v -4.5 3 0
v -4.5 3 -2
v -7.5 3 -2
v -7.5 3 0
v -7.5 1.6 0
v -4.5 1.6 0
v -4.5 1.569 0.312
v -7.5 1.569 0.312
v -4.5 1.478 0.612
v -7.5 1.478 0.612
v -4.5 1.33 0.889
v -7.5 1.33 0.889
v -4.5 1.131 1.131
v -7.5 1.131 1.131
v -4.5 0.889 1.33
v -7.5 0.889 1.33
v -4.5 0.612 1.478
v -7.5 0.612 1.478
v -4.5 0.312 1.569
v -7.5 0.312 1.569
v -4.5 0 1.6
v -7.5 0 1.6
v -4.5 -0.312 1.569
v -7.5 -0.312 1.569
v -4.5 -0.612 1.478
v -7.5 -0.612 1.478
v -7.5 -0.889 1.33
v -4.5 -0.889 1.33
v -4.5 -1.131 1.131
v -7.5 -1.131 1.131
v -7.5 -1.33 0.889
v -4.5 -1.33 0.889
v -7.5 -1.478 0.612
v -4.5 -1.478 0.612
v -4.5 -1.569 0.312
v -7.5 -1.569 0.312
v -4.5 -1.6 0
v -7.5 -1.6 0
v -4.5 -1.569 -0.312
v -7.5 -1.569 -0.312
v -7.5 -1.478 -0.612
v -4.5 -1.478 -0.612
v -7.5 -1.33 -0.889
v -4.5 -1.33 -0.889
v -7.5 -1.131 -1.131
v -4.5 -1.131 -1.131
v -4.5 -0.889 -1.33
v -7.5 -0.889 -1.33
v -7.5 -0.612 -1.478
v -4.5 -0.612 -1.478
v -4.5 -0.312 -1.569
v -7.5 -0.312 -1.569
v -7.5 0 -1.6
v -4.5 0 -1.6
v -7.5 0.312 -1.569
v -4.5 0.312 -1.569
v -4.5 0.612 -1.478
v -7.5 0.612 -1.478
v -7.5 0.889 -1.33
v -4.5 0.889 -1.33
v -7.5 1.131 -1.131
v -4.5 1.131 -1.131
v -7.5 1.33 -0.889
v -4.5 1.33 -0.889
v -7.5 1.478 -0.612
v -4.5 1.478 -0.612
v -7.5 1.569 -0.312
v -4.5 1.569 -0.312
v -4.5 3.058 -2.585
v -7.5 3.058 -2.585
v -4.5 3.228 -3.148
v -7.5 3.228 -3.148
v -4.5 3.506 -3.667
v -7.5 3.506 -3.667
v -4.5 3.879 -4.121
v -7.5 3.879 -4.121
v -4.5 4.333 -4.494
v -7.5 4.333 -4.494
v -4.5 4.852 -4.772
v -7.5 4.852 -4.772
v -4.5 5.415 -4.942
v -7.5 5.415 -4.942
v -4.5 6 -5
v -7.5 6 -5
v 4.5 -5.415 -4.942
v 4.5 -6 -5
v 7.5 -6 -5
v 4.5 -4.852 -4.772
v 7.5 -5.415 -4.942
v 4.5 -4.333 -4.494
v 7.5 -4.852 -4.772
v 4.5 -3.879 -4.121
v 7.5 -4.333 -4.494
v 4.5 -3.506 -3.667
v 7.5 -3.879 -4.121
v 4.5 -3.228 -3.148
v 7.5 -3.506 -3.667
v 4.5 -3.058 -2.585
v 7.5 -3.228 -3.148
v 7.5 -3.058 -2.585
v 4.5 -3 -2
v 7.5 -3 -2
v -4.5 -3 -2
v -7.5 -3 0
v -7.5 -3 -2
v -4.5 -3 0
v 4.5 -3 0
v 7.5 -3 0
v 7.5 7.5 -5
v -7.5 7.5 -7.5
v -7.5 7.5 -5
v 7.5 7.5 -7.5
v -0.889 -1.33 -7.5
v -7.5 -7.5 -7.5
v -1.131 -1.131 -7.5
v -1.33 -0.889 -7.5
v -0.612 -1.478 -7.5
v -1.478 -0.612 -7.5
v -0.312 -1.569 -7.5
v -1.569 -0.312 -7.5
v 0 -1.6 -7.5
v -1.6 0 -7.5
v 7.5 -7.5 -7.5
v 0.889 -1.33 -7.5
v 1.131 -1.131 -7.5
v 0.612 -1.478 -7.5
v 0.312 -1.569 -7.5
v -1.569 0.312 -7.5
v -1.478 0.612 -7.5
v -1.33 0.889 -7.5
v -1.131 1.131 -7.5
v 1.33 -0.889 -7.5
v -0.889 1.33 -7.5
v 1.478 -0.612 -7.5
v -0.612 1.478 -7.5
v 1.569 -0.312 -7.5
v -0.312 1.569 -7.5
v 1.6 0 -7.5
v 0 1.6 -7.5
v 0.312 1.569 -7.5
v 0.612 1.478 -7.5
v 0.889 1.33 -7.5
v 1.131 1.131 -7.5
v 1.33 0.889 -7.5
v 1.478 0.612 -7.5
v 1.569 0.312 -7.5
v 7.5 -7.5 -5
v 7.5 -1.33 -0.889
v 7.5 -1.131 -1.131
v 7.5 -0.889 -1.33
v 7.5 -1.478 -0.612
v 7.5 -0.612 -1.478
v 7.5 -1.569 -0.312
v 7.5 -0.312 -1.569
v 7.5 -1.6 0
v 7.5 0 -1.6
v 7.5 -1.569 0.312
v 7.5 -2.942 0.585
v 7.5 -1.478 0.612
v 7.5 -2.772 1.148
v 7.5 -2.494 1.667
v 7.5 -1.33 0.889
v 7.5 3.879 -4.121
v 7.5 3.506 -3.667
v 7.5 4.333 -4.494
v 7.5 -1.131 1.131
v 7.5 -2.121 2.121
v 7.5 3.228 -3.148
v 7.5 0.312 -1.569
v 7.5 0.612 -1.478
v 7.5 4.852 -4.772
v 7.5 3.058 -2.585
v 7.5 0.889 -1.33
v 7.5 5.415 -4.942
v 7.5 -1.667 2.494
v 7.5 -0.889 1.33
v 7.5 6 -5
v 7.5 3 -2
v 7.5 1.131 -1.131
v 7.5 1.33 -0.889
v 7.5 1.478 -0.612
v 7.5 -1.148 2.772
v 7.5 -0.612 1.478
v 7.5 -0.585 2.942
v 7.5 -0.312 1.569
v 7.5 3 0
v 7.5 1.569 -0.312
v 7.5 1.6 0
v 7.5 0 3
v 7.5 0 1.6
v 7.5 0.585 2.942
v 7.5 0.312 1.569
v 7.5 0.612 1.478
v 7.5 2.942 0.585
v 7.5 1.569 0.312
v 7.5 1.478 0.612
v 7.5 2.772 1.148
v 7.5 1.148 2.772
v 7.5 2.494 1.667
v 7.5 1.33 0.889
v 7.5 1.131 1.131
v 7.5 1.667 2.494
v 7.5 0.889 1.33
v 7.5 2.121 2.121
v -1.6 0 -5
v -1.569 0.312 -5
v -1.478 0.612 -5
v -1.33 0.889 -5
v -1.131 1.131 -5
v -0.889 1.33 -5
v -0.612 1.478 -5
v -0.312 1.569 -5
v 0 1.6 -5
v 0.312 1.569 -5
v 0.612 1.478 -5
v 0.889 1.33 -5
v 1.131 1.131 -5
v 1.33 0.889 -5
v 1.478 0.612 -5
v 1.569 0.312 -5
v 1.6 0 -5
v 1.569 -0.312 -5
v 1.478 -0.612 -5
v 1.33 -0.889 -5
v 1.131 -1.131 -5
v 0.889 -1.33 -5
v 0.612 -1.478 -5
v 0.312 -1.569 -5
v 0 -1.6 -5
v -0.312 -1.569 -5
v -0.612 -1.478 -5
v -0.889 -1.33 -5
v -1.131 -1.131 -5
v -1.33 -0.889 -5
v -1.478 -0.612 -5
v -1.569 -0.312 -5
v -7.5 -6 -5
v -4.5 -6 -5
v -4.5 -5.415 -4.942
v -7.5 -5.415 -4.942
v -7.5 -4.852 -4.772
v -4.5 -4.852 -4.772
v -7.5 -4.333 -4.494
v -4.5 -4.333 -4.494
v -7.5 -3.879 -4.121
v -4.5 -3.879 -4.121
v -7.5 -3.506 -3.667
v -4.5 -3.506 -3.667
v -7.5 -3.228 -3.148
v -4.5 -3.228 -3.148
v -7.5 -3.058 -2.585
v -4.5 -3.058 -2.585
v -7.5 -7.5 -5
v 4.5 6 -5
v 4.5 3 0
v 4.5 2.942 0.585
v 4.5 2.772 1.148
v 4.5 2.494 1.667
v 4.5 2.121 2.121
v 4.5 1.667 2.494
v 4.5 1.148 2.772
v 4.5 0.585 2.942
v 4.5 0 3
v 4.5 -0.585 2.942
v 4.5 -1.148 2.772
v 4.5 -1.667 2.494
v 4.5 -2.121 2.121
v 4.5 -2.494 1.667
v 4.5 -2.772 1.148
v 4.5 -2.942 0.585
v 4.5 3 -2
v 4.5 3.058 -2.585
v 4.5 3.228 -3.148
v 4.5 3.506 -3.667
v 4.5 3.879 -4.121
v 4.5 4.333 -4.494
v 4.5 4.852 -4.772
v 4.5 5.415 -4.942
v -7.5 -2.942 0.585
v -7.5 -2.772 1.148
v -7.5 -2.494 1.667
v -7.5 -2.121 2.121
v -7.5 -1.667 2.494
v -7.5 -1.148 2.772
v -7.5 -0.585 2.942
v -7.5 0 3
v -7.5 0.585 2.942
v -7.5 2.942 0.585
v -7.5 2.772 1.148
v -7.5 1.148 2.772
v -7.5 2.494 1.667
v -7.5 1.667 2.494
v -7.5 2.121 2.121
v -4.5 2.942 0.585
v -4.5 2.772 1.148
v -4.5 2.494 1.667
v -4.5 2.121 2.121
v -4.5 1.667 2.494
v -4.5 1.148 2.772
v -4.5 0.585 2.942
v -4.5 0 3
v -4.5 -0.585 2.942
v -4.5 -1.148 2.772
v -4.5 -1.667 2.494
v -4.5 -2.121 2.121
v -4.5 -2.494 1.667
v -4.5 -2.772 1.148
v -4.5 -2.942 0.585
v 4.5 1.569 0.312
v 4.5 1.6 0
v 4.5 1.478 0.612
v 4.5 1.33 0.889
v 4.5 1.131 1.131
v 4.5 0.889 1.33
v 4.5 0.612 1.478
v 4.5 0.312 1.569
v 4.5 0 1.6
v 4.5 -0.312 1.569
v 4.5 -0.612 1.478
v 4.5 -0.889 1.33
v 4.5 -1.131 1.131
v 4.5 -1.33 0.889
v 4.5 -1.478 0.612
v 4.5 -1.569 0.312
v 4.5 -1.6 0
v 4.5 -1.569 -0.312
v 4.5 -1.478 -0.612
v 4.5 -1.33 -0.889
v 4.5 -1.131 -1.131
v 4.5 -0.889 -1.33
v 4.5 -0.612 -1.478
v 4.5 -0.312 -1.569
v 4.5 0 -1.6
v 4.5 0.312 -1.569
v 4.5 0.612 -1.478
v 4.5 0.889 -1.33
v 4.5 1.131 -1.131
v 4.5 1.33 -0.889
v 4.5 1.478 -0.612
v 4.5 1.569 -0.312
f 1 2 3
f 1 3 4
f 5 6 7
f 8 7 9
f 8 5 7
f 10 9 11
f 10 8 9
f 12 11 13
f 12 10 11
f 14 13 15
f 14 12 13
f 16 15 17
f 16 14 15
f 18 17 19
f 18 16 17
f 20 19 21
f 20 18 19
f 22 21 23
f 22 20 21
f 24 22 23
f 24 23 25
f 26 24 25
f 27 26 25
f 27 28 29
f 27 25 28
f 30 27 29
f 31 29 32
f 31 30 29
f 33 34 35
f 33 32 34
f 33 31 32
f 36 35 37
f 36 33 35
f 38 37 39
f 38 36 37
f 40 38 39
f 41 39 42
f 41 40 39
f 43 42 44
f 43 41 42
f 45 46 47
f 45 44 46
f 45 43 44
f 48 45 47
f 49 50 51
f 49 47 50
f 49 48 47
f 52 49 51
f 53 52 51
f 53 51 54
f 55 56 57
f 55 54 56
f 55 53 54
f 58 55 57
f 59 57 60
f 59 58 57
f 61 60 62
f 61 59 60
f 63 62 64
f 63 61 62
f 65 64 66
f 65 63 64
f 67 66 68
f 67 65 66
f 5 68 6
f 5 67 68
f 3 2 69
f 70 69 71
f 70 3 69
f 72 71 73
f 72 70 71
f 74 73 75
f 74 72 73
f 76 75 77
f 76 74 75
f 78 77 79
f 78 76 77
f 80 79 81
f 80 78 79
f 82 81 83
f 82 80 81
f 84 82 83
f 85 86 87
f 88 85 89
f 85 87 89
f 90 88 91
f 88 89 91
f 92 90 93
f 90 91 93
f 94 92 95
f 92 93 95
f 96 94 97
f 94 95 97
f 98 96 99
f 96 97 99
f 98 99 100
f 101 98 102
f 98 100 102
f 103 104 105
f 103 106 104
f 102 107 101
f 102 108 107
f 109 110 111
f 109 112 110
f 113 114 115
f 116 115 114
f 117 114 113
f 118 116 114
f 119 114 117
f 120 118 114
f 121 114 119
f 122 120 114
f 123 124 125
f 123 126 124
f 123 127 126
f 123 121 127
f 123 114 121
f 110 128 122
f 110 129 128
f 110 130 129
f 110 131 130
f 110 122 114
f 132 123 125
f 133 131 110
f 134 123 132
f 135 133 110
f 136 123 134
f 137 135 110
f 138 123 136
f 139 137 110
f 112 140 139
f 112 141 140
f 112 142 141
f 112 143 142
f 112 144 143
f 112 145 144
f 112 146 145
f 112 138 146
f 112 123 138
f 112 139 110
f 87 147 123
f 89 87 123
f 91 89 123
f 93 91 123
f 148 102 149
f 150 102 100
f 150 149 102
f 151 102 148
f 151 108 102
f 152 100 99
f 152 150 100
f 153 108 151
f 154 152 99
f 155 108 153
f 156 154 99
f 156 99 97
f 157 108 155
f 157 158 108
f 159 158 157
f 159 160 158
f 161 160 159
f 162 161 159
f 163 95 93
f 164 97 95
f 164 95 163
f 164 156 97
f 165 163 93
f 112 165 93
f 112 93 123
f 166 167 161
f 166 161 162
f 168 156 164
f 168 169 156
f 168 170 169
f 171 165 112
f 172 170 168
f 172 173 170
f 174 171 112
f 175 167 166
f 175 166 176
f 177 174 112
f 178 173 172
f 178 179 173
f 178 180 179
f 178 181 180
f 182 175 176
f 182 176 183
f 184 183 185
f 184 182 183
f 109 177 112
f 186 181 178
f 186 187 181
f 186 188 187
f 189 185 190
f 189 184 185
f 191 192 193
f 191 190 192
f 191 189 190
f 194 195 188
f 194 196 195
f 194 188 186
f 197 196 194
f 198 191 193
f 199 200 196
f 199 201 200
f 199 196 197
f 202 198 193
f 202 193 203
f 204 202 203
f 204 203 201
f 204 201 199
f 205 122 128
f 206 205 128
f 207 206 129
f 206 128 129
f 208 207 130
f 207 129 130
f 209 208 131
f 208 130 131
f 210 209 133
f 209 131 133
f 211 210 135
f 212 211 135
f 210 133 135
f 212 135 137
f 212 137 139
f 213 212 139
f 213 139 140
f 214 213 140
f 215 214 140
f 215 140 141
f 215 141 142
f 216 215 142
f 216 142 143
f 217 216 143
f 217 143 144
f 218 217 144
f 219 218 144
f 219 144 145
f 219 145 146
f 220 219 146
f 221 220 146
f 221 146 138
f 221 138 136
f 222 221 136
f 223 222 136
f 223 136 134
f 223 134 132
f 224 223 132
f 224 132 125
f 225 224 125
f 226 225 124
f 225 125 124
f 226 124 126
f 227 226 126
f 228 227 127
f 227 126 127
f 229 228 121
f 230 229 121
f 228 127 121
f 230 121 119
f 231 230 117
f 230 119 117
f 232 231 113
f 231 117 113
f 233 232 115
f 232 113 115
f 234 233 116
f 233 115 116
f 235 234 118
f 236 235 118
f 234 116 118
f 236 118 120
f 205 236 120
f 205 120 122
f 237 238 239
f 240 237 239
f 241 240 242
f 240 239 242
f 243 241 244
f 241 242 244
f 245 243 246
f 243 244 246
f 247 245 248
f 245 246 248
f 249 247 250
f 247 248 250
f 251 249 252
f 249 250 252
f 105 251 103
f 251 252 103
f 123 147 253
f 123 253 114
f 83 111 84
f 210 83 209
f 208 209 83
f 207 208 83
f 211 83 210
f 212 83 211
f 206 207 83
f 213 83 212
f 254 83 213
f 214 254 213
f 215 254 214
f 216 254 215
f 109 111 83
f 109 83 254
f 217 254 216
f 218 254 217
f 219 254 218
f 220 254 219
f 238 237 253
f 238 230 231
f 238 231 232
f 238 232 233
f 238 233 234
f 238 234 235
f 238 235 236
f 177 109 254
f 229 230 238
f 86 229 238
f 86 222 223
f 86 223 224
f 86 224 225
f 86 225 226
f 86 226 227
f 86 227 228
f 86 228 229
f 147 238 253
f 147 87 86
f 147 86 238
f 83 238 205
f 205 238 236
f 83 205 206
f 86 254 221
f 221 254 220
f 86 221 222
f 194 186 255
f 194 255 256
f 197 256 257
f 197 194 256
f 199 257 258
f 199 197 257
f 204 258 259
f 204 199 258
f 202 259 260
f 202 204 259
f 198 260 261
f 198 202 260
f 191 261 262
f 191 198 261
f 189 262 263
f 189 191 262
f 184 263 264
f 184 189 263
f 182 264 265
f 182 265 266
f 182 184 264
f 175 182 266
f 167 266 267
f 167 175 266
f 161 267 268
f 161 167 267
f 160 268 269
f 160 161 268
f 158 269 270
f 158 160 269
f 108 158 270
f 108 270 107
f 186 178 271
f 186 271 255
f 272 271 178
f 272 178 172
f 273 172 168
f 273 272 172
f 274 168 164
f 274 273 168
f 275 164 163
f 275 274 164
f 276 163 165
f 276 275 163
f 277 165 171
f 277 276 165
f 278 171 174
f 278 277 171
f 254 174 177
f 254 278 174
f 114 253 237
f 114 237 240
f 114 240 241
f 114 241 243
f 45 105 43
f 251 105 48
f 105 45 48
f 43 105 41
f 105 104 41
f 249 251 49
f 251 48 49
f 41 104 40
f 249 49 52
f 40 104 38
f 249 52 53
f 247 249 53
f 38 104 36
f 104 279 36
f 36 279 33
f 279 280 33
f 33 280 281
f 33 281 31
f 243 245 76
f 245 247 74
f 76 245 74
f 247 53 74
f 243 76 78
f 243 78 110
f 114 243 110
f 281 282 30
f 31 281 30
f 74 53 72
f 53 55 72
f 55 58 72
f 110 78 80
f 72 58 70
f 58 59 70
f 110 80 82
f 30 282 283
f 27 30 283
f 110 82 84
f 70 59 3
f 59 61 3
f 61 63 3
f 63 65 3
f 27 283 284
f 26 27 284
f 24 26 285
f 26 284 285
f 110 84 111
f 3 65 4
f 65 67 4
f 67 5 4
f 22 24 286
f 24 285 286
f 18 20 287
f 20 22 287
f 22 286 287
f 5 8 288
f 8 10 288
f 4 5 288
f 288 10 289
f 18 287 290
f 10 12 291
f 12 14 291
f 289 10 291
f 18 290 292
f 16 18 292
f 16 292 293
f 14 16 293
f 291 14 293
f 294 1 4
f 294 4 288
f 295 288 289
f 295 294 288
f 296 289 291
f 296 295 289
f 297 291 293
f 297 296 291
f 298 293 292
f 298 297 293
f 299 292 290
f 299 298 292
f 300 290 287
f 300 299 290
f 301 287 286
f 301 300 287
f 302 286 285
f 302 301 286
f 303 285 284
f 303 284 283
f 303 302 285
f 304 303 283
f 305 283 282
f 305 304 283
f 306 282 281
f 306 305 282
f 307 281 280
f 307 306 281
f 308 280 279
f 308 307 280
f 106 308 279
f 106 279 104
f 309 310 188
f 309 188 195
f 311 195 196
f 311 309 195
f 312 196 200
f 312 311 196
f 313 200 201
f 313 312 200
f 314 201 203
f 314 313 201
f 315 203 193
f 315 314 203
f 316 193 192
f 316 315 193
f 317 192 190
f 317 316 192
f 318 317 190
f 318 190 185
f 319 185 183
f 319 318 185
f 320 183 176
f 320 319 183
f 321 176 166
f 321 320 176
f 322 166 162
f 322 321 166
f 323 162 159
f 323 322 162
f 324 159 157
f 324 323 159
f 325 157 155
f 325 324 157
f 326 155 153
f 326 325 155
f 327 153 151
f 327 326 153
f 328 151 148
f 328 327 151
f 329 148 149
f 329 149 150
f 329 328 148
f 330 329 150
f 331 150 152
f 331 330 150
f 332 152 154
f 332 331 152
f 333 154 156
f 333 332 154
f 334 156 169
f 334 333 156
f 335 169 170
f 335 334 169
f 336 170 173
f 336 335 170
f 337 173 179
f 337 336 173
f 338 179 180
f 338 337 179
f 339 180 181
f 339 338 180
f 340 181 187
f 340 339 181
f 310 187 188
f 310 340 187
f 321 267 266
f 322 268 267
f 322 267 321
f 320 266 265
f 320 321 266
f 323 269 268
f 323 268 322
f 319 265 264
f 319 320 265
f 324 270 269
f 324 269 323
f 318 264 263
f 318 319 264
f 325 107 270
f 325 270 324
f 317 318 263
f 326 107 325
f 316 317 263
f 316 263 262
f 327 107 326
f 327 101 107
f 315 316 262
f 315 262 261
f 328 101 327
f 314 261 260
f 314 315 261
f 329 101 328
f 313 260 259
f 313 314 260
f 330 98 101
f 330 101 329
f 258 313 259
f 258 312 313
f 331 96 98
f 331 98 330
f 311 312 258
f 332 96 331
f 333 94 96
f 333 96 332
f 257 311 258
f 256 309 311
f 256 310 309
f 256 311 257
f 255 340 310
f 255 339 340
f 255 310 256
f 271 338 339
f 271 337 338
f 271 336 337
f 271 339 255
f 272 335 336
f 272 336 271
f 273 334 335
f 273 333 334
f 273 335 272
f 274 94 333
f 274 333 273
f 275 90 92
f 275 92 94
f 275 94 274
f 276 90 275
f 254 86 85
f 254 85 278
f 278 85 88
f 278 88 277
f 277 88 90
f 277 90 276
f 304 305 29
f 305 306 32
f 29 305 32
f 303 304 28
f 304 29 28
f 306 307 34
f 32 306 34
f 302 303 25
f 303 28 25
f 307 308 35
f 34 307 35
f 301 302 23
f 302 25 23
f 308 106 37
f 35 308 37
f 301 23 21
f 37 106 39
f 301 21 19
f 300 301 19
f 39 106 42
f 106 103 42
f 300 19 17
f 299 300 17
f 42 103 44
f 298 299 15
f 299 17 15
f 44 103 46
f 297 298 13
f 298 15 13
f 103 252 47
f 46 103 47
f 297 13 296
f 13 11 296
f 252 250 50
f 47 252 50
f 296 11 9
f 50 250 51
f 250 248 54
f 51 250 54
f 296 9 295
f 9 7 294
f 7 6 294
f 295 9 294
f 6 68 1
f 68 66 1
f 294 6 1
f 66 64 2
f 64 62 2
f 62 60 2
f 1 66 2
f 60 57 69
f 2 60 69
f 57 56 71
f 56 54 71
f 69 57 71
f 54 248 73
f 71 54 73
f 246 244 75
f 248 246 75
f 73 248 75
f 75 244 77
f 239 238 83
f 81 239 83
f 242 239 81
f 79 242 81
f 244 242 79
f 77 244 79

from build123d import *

# Parameters (mm, degrees)
F0_R     = 1.6
F1_DEPTH = 7.5
F2_R     = 3
F3_W     = 9
F3_H     = 46.435098
F4_DEPTH = 8.001
F6_D     = 3.2


with BuildPart() as f1:
    # F0 (on Right) → F1 (new body, symmetric)
    with BuildSketch(Plane.YZ):
        with BuildLine():
            ThreePointArc((3, 0), (0, 3), (-3, 0))
            Line((-3, 0), (-3, -5))
            Line((-3, -5), (-7.5, -5))
            Line((-7.5, -5), (-7.5, -7.5))
            Line((-7.5, -7.5), (7.5, -7.5))
            Line((7.5, -7.5), (7.5, -5))
            Line((7.5, -5), (3, -5))
            Line((3, -5), (3, 0))
        make_face()
        Circle(F0_R, mode=Mode.SUBTRACT)
    extrude(amount=F1_DEPTH, both=True)

    # F2
    f2_edges = [f1.edges().sort_by_distance(p)[0] for p in [
        (0, -3, -5),
        (0, 3, -5),
    ]]
    fillet(f2_edges, radius=F2_R)

    # F3 (on face) → F4 (cut, through all)
    with BuildSketch(Plane.XY.offset(-5)):
        Rectangle(F3_W, F3_H)
    extrude(amount=F4_DEPTH, mode=Mode.SUBTRACT)

    # F6 (through all)
    with Locations(Plane.XY):
        with Locations((0, 0)):
            Hole(F6_D / 2)


solid = f1.part
